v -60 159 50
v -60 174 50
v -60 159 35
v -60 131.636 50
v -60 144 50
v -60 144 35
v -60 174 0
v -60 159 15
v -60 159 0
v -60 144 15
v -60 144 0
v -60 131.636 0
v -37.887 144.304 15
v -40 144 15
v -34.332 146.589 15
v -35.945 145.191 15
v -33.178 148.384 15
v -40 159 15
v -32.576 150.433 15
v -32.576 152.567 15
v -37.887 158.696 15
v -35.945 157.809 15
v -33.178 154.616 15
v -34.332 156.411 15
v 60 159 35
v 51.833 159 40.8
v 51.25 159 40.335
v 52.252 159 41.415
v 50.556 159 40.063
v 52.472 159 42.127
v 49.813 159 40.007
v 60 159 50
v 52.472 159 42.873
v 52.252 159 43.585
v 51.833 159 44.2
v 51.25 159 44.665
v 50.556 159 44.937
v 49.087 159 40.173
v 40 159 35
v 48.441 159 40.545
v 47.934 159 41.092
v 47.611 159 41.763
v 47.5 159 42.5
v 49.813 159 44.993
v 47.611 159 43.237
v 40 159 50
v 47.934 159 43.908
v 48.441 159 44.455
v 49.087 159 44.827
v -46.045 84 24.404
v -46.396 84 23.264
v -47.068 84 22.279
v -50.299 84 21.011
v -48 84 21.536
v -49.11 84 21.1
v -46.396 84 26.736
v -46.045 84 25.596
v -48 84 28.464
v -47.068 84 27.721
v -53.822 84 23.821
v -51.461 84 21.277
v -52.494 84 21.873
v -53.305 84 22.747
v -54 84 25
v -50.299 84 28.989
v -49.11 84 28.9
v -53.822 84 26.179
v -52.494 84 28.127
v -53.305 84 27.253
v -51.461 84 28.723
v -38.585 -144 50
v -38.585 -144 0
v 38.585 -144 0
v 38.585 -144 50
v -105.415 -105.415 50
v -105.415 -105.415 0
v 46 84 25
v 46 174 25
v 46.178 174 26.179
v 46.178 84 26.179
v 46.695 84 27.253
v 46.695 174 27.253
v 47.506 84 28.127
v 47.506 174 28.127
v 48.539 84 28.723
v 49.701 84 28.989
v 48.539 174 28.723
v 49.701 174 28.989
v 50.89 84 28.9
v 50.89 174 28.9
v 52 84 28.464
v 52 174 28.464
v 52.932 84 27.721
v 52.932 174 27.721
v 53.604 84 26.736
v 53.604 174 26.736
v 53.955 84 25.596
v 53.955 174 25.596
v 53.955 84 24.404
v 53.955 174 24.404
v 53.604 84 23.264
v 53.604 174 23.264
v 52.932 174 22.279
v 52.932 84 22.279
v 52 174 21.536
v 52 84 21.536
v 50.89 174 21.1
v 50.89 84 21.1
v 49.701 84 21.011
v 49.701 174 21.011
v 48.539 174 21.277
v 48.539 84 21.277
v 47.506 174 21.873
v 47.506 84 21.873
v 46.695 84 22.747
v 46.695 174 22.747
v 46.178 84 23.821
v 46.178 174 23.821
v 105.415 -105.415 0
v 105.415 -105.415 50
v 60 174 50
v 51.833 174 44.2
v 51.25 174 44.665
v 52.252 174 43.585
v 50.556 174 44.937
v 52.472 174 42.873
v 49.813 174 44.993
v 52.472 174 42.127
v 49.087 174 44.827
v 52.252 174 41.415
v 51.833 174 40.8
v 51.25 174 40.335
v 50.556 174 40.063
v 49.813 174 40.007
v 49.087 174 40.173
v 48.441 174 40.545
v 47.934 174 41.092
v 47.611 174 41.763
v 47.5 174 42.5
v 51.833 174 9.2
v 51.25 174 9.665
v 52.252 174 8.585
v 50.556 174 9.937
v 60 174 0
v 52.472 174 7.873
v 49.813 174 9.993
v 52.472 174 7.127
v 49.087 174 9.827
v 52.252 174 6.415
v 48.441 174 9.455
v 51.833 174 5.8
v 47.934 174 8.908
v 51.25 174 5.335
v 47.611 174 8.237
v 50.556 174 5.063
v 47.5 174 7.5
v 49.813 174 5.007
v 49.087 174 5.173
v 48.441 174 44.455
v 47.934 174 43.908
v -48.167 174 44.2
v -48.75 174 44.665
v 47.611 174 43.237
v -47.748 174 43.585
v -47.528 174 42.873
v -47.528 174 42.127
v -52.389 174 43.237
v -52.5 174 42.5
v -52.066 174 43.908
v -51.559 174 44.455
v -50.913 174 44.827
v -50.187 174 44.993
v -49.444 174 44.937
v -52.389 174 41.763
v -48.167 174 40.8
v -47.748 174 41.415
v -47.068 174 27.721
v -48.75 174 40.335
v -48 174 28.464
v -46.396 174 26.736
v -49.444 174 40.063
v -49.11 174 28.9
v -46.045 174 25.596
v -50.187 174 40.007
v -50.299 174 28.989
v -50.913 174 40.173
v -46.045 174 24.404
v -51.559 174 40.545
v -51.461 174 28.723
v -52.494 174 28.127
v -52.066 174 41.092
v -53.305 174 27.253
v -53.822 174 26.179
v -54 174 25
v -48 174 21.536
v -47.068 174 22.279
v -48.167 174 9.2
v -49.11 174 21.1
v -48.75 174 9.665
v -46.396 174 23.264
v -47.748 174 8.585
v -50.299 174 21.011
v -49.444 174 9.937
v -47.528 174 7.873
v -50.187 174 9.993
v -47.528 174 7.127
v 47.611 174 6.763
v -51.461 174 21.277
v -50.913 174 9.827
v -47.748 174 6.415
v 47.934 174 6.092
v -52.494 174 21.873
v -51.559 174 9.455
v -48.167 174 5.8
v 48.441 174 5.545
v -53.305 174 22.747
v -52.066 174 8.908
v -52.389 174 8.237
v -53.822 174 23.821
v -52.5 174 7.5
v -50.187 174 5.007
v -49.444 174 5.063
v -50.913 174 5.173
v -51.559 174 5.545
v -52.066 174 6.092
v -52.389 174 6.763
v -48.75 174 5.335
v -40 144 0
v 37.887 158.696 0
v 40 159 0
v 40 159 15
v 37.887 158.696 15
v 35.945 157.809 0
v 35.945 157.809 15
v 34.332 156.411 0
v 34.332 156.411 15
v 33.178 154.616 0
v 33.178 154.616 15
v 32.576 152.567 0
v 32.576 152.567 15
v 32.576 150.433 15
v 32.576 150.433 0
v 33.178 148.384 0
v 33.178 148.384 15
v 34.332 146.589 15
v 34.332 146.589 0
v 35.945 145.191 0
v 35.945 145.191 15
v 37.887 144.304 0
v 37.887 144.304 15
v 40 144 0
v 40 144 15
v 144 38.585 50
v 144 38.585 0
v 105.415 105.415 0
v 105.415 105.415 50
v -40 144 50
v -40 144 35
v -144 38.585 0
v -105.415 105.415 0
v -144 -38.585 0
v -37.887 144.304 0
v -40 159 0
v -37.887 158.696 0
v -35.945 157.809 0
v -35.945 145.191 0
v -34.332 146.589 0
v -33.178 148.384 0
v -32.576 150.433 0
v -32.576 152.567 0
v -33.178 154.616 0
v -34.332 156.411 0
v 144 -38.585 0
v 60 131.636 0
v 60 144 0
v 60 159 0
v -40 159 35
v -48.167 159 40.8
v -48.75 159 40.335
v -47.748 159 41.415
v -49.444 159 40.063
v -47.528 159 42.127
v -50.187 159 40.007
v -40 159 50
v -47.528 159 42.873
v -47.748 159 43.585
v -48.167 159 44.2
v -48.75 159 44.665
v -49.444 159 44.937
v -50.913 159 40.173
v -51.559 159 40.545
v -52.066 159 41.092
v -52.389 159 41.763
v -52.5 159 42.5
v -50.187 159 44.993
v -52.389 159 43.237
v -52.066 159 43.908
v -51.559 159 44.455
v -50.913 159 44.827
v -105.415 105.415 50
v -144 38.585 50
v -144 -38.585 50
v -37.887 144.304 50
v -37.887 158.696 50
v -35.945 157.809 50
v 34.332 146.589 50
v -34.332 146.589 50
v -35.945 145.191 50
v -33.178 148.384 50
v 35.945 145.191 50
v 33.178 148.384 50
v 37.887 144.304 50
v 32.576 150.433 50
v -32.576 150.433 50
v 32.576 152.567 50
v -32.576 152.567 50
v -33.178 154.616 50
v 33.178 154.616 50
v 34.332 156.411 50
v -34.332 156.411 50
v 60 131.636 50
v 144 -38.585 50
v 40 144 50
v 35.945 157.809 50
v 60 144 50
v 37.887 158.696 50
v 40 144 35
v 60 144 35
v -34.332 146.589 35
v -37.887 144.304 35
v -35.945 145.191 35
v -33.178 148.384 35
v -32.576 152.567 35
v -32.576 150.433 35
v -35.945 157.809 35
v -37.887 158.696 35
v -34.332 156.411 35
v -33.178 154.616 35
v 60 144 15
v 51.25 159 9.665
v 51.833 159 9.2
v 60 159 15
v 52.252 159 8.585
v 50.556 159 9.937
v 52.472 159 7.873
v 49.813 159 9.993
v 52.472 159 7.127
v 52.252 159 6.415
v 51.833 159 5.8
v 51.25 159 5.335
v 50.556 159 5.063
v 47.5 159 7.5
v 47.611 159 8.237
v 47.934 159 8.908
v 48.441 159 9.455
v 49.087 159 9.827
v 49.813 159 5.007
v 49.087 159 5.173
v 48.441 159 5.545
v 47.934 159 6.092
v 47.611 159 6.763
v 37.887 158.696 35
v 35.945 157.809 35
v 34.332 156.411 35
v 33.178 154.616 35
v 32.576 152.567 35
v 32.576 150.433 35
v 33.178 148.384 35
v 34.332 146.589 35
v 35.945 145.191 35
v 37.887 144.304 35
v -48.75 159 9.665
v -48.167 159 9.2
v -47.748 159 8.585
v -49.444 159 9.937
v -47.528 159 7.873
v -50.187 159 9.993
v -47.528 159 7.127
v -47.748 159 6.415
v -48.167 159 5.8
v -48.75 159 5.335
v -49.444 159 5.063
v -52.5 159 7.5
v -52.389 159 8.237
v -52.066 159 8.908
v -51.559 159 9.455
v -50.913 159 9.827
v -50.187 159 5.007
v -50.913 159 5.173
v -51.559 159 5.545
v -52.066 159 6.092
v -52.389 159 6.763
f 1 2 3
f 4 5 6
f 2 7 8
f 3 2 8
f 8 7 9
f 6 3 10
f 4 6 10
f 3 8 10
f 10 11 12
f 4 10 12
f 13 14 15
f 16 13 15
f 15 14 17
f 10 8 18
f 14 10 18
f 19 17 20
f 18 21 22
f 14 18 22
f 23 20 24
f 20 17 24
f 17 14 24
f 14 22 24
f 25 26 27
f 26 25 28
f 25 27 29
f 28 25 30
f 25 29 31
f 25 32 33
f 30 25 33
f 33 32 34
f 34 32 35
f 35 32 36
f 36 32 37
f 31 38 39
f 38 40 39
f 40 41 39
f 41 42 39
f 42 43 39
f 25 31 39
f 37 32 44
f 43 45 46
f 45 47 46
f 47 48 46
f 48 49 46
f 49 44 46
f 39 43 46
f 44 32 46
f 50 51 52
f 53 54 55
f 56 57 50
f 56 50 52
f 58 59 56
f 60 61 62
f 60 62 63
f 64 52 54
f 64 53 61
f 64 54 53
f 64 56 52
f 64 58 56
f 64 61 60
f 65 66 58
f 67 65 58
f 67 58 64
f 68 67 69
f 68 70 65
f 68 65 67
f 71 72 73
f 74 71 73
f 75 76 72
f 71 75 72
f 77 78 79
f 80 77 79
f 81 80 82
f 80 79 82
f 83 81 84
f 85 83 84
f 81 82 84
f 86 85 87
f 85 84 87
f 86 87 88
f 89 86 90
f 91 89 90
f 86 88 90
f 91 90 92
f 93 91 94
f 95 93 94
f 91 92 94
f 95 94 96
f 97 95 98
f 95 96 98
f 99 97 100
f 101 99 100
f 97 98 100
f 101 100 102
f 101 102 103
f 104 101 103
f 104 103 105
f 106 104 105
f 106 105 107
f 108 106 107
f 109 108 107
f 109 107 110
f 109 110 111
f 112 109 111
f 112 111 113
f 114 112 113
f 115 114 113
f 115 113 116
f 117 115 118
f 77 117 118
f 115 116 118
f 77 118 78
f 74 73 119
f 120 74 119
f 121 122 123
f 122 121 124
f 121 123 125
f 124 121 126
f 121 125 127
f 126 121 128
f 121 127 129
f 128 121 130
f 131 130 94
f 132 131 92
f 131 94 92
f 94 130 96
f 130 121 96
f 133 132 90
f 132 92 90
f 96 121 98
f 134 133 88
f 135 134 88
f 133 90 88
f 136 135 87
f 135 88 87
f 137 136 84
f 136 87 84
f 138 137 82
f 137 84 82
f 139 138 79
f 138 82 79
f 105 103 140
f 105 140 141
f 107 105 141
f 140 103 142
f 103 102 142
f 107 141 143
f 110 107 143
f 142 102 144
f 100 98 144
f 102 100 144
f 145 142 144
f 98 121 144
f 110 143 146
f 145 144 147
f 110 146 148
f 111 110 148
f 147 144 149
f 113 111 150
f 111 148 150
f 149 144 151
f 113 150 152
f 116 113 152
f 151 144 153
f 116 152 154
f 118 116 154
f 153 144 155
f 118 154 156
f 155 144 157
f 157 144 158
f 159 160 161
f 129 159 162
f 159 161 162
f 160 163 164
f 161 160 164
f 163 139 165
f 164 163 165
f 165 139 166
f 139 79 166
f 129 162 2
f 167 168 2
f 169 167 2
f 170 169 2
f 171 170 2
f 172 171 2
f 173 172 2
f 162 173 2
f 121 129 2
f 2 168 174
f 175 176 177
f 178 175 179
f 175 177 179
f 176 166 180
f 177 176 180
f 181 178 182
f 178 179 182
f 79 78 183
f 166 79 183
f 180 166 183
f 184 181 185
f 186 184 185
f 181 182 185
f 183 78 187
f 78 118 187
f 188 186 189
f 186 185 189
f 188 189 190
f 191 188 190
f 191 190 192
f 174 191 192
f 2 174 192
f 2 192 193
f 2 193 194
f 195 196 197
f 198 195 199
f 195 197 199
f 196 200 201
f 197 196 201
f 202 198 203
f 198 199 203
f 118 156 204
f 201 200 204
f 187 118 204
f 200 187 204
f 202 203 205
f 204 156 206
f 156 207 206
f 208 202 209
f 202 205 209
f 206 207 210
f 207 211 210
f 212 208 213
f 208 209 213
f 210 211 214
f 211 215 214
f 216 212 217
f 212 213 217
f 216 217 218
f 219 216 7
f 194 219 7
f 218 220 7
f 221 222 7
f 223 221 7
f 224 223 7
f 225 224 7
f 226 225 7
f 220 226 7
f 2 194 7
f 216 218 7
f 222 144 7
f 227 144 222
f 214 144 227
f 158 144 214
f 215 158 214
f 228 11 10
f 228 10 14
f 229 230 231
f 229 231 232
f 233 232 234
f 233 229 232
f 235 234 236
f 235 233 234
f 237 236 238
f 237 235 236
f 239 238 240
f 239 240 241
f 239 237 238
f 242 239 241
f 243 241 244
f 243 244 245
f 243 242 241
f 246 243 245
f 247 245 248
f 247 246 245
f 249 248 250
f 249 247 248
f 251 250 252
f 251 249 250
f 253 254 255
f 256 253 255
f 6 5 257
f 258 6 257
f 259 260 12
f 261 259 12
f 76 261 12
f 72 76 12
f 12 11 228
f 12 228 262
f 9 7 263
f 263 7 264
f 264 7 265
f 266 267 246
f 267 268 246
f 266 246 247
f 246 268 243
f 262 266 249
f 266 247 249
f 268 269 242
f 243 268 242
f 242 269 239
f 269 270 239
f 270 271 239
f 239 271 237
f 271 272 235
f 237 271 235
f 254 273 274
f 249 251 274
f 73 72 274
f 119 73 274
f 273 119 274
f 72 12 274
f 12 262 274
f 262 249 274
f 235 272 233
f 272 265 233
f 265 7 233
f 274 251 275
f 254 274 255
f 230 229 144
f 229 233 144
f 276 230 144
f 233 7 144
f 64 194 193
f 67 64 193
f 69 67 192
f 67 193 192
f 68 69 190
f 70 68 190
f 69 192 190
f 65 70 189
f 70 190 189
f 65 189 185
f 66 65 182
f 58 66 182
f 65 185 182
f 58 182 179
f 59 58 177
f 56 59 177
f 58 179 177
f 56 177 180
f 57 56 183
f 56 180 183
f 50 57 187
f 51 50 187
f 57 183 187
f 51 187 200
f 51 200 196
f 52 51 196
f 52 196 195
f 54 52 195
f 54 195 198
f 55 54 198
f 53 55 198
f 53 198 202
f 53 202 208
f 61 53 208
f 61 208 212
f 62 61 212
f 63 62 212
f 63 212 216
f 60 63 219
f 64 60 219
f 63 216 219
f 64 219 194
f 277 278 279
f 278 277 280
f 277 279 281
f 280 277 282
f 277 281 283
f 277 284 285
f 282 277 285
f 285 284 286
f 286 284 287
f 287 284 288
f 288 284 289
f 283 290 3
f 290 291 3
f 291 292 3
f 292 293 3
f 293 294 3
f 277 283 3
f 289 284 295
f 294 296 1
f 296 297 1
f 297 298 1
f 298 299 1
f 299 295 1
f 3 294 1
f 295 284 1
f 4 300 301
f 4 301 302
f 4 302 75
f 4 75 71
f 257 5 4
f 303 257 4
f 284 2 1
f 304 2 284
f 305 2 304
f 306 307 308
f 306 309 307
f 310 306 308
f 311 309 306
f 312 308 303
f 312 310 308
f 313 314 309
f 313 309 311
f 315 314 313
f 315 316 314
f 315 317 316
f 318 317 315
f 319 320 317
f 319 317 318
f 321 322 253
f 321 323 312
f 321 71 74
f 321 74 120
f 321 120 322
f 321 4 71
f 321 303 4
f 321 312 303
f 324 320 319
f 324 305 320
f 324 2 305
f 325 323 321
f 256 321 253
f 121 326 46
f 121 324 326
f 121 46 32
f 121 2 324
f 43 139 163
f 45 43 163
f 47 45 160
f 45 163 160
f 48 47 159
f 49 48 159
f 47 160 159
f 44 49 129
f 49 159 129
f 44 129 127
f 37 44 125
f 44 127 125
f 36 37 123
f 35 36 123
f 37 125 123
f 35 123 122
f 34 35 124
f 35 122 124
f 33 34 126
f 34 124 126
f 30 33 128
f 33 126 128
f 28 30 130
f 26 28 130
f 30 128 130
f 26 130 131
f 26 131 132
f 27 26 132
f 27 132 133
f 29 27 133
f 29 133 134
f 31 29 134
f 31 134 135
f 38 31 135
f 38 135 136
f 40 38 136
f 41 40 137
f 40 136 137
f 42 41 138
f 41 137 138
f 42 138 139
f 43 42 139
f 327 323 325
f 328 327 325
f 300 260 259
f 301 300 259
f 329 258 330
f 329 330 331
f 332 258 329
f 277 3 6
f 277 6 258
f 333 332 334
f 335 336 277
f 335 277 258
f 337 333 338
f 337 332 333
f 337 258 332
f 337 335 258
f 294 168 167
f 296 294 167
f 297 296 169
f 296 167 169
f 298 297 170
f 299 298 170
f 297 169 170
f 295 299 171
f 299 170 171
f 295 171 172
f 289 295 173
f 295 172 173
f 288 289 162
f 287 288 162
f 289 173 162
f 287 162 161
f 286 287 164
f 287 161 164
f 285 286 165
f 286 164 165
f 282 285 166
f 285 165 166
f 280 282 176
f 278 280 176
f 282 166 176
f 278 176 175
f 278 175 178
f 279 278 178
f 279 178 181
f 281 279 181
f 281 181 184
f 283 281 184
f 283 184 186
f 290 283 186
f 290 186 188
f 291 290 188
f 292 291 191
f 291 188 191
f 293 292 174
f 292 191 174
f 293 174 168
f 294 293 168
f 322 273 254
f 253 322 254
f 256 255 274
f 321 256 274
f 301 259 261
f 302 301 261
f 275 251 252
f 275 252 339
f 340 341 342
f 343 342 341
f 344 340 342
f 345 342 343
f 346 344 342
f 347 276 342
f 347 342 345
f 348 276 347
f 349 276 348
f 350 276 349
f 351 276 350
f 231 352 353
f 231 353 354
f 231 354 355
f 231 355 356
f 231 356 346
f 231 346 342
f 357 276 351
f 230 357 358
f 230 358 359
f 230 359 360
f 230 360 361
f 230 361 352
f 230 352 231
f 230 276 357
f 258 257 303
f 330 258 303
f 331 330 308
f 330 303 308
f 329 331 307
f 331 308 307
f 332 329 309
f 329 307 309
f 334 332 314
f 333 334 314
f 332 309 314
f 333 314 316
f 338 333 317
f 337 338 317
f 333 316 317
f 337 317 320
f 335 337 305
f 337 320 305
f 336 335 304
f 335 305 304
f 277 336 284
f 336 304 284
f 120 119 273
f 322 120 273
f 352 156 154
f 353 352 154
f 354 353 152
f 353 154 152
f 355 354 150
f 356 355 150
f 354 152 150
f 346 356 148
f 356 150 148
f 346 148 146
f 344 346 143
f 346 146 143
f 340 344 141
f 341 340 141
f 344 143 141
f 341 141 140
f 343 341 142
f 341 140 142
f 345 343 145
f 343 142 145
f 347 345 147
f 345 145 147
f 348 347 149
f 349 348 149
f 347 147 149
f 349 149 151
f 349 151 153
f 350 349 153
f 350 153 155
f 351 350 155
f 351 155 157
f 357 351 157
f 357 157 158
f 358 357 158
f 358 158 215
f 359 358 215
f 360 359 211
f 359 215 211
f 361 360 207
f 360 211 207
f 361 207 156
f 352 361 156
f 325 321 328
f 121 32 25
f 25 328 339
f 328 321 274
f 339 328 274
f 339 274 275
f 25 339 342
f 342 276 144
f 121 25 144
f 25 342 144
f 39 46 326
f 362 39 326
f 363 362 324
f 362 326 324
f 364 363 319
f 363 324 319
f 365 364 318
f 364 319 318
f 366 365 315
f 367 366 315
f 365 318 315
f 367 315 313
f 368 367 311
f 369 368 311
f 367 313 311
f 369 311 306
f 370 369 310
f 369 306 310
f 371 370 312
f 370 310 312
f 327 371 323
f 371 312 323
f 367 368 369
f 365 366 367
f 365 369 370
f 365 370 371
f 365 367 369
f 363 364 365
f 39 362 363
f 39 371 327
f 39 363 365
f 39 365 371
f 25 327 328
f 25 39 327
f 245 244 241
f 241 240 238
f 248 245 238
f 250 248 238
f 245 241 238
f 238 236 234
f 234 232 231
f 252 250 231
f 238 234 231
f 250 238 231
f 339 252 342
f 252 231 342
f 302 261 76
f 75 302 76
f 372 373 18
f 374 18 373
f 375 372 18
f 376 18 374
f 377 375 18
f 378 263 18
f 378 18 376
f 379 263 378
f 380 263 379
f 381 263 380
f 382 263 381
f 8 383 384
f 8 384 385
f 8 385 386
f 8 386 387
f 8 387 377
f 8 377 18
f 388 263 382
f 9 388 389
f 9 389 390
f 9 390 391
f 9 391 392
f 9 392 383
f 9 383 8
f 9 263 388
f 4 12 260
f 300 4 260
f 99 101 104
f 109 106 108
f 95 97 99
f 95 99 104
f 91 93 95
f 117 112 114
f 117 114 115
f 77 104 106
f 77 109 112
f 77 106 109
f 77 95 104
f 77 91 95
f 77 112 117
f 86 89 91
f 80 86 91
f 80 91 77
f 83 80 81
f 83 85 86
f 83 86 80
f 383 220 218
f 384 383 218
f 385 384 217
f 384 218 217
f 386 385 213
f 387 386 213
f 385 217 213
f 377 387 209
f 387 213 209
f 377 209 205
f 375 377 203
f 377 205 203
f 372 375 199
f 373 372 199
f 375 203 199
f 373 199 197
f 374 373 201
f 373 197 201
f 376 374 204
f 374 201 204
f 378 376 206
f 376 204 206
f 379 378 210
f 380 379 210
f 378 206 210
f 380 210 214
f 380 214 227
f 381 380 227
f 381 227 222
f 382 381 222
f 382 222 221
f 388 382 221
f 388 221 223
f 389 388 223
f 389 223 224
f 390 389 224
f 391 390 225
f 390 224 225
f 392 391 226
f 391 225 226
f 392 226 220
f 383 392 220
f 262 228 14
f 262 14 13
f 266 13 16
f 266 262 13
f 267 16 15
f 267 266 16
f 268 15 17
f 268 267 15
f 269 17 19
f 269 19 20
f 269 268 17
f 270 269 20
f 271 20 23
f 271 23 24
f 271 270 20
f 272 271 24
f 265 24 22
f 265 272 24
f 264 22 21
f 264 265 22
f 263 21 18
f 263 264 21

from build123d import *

# Parameters (mm, degrees)
F1_DEPTH = 50
F3_DEPTH = 15
F5_DEPTH = 15
F6_R     = 4
F7_DEPTH = 90
F6_R_2   = 2.5
F8_DEPTH = 15


with BuildPart() as f1:
    # F0 (on Top) → F1 (new body)
    with BuildSketch(Plane.XY):
        Polygon((144, 38.584684), (105.415316, 105.415316), (60, 131.635861), (60, 174), (-60, 174), (-60, 131.635861), (-105.415316, 105.415316), (-144, 38.584684), (-144, -38.584684), (-105.415316, -105.415316), (-38.584684, -144), (38.584684, -144), (105.415316, -105.415316), (144, -38.584684), align=None)
    extrude(amount=F1_DEPTH)

    # F2 (on face) → F3 (cut)
    with BuildSketch(Plane.XY.offset(50)):
        with BuildLine():
            Line((-40, 159), (-60, 159))
            Line((-60, 159), (-60, 144))
            Line((-60, 144), (-40, 144))
            ThreePointArc((-40, 144), (-32.5, 151.5), (-40, 159))
        make_face()
        with BuildLine():
            Line((60, 144), (60, 159))
            Line((60, 159), (40, 159))
            ThreePointArc((40, 159), (32.5, 151.5), (40, 144))
            Line((40, 144), (60, 144))
        make_face()
    extrude(amount=-F3_DEPTH, mode=Mode.SUBTRACT)

    # F4 (on face) → F5 (cut)
    with BuildSketch(Plane.XY):
        with BuildLine():
            Line((60, 144), (60, 159))
            Line((60, 159), (40, 159))
            ThreePointArc((40, 159), (32.5, 151.5), (40, 144))
            Line((40, 144), (60, 144))
        make_face()
        with BuildLine():
            Line((-40, 159), (-60, 159))
            Line((-60, 159), (-60, 144))
            Line((-60, 144), (-40, 144))
            ThreePointArc((-40, 144), (-32.5, 151.5), (-40, 159))
        make_face()
    extrude(amount=F5_DEPTH, mode=Mode.SUBTRACT)

    # F6 (on face) → F7 (cut)
    with BuildSketch(Plane(origin=(0, 174, 0), x_dir=(-1, 0, 0), z_dir=(0, 1, 0))):
        with Locations((-50, 25)):
            Circle(F6_R)
        with Locations((50, 25)):
            Circle(F6_R)
    extrude(amount=-F7_DEPTH, mode=Mode.SUBTRACT)

    # F6 (on face) → F8 (cut, through all)
    with BuildSketch(Plane(origin=(0, 174, 0), x_dir=(-1, 0, 0), z_dir=(0, 1, 0))):
        with Locations((-50, 42.5)):
            Circle(F6_R_2)
        with Locations((-50, 7.5)):
            Circle(F6_R_2)
        with Locations((50, 7.5)):
            Circle(F6_R_2)
        with Locations((50, 42.5)):
            Circle(F6_R_2)
    extrude(amount=-F8_DEPTH, mode=Mode.SUBTRACT)


solid = f1.part
